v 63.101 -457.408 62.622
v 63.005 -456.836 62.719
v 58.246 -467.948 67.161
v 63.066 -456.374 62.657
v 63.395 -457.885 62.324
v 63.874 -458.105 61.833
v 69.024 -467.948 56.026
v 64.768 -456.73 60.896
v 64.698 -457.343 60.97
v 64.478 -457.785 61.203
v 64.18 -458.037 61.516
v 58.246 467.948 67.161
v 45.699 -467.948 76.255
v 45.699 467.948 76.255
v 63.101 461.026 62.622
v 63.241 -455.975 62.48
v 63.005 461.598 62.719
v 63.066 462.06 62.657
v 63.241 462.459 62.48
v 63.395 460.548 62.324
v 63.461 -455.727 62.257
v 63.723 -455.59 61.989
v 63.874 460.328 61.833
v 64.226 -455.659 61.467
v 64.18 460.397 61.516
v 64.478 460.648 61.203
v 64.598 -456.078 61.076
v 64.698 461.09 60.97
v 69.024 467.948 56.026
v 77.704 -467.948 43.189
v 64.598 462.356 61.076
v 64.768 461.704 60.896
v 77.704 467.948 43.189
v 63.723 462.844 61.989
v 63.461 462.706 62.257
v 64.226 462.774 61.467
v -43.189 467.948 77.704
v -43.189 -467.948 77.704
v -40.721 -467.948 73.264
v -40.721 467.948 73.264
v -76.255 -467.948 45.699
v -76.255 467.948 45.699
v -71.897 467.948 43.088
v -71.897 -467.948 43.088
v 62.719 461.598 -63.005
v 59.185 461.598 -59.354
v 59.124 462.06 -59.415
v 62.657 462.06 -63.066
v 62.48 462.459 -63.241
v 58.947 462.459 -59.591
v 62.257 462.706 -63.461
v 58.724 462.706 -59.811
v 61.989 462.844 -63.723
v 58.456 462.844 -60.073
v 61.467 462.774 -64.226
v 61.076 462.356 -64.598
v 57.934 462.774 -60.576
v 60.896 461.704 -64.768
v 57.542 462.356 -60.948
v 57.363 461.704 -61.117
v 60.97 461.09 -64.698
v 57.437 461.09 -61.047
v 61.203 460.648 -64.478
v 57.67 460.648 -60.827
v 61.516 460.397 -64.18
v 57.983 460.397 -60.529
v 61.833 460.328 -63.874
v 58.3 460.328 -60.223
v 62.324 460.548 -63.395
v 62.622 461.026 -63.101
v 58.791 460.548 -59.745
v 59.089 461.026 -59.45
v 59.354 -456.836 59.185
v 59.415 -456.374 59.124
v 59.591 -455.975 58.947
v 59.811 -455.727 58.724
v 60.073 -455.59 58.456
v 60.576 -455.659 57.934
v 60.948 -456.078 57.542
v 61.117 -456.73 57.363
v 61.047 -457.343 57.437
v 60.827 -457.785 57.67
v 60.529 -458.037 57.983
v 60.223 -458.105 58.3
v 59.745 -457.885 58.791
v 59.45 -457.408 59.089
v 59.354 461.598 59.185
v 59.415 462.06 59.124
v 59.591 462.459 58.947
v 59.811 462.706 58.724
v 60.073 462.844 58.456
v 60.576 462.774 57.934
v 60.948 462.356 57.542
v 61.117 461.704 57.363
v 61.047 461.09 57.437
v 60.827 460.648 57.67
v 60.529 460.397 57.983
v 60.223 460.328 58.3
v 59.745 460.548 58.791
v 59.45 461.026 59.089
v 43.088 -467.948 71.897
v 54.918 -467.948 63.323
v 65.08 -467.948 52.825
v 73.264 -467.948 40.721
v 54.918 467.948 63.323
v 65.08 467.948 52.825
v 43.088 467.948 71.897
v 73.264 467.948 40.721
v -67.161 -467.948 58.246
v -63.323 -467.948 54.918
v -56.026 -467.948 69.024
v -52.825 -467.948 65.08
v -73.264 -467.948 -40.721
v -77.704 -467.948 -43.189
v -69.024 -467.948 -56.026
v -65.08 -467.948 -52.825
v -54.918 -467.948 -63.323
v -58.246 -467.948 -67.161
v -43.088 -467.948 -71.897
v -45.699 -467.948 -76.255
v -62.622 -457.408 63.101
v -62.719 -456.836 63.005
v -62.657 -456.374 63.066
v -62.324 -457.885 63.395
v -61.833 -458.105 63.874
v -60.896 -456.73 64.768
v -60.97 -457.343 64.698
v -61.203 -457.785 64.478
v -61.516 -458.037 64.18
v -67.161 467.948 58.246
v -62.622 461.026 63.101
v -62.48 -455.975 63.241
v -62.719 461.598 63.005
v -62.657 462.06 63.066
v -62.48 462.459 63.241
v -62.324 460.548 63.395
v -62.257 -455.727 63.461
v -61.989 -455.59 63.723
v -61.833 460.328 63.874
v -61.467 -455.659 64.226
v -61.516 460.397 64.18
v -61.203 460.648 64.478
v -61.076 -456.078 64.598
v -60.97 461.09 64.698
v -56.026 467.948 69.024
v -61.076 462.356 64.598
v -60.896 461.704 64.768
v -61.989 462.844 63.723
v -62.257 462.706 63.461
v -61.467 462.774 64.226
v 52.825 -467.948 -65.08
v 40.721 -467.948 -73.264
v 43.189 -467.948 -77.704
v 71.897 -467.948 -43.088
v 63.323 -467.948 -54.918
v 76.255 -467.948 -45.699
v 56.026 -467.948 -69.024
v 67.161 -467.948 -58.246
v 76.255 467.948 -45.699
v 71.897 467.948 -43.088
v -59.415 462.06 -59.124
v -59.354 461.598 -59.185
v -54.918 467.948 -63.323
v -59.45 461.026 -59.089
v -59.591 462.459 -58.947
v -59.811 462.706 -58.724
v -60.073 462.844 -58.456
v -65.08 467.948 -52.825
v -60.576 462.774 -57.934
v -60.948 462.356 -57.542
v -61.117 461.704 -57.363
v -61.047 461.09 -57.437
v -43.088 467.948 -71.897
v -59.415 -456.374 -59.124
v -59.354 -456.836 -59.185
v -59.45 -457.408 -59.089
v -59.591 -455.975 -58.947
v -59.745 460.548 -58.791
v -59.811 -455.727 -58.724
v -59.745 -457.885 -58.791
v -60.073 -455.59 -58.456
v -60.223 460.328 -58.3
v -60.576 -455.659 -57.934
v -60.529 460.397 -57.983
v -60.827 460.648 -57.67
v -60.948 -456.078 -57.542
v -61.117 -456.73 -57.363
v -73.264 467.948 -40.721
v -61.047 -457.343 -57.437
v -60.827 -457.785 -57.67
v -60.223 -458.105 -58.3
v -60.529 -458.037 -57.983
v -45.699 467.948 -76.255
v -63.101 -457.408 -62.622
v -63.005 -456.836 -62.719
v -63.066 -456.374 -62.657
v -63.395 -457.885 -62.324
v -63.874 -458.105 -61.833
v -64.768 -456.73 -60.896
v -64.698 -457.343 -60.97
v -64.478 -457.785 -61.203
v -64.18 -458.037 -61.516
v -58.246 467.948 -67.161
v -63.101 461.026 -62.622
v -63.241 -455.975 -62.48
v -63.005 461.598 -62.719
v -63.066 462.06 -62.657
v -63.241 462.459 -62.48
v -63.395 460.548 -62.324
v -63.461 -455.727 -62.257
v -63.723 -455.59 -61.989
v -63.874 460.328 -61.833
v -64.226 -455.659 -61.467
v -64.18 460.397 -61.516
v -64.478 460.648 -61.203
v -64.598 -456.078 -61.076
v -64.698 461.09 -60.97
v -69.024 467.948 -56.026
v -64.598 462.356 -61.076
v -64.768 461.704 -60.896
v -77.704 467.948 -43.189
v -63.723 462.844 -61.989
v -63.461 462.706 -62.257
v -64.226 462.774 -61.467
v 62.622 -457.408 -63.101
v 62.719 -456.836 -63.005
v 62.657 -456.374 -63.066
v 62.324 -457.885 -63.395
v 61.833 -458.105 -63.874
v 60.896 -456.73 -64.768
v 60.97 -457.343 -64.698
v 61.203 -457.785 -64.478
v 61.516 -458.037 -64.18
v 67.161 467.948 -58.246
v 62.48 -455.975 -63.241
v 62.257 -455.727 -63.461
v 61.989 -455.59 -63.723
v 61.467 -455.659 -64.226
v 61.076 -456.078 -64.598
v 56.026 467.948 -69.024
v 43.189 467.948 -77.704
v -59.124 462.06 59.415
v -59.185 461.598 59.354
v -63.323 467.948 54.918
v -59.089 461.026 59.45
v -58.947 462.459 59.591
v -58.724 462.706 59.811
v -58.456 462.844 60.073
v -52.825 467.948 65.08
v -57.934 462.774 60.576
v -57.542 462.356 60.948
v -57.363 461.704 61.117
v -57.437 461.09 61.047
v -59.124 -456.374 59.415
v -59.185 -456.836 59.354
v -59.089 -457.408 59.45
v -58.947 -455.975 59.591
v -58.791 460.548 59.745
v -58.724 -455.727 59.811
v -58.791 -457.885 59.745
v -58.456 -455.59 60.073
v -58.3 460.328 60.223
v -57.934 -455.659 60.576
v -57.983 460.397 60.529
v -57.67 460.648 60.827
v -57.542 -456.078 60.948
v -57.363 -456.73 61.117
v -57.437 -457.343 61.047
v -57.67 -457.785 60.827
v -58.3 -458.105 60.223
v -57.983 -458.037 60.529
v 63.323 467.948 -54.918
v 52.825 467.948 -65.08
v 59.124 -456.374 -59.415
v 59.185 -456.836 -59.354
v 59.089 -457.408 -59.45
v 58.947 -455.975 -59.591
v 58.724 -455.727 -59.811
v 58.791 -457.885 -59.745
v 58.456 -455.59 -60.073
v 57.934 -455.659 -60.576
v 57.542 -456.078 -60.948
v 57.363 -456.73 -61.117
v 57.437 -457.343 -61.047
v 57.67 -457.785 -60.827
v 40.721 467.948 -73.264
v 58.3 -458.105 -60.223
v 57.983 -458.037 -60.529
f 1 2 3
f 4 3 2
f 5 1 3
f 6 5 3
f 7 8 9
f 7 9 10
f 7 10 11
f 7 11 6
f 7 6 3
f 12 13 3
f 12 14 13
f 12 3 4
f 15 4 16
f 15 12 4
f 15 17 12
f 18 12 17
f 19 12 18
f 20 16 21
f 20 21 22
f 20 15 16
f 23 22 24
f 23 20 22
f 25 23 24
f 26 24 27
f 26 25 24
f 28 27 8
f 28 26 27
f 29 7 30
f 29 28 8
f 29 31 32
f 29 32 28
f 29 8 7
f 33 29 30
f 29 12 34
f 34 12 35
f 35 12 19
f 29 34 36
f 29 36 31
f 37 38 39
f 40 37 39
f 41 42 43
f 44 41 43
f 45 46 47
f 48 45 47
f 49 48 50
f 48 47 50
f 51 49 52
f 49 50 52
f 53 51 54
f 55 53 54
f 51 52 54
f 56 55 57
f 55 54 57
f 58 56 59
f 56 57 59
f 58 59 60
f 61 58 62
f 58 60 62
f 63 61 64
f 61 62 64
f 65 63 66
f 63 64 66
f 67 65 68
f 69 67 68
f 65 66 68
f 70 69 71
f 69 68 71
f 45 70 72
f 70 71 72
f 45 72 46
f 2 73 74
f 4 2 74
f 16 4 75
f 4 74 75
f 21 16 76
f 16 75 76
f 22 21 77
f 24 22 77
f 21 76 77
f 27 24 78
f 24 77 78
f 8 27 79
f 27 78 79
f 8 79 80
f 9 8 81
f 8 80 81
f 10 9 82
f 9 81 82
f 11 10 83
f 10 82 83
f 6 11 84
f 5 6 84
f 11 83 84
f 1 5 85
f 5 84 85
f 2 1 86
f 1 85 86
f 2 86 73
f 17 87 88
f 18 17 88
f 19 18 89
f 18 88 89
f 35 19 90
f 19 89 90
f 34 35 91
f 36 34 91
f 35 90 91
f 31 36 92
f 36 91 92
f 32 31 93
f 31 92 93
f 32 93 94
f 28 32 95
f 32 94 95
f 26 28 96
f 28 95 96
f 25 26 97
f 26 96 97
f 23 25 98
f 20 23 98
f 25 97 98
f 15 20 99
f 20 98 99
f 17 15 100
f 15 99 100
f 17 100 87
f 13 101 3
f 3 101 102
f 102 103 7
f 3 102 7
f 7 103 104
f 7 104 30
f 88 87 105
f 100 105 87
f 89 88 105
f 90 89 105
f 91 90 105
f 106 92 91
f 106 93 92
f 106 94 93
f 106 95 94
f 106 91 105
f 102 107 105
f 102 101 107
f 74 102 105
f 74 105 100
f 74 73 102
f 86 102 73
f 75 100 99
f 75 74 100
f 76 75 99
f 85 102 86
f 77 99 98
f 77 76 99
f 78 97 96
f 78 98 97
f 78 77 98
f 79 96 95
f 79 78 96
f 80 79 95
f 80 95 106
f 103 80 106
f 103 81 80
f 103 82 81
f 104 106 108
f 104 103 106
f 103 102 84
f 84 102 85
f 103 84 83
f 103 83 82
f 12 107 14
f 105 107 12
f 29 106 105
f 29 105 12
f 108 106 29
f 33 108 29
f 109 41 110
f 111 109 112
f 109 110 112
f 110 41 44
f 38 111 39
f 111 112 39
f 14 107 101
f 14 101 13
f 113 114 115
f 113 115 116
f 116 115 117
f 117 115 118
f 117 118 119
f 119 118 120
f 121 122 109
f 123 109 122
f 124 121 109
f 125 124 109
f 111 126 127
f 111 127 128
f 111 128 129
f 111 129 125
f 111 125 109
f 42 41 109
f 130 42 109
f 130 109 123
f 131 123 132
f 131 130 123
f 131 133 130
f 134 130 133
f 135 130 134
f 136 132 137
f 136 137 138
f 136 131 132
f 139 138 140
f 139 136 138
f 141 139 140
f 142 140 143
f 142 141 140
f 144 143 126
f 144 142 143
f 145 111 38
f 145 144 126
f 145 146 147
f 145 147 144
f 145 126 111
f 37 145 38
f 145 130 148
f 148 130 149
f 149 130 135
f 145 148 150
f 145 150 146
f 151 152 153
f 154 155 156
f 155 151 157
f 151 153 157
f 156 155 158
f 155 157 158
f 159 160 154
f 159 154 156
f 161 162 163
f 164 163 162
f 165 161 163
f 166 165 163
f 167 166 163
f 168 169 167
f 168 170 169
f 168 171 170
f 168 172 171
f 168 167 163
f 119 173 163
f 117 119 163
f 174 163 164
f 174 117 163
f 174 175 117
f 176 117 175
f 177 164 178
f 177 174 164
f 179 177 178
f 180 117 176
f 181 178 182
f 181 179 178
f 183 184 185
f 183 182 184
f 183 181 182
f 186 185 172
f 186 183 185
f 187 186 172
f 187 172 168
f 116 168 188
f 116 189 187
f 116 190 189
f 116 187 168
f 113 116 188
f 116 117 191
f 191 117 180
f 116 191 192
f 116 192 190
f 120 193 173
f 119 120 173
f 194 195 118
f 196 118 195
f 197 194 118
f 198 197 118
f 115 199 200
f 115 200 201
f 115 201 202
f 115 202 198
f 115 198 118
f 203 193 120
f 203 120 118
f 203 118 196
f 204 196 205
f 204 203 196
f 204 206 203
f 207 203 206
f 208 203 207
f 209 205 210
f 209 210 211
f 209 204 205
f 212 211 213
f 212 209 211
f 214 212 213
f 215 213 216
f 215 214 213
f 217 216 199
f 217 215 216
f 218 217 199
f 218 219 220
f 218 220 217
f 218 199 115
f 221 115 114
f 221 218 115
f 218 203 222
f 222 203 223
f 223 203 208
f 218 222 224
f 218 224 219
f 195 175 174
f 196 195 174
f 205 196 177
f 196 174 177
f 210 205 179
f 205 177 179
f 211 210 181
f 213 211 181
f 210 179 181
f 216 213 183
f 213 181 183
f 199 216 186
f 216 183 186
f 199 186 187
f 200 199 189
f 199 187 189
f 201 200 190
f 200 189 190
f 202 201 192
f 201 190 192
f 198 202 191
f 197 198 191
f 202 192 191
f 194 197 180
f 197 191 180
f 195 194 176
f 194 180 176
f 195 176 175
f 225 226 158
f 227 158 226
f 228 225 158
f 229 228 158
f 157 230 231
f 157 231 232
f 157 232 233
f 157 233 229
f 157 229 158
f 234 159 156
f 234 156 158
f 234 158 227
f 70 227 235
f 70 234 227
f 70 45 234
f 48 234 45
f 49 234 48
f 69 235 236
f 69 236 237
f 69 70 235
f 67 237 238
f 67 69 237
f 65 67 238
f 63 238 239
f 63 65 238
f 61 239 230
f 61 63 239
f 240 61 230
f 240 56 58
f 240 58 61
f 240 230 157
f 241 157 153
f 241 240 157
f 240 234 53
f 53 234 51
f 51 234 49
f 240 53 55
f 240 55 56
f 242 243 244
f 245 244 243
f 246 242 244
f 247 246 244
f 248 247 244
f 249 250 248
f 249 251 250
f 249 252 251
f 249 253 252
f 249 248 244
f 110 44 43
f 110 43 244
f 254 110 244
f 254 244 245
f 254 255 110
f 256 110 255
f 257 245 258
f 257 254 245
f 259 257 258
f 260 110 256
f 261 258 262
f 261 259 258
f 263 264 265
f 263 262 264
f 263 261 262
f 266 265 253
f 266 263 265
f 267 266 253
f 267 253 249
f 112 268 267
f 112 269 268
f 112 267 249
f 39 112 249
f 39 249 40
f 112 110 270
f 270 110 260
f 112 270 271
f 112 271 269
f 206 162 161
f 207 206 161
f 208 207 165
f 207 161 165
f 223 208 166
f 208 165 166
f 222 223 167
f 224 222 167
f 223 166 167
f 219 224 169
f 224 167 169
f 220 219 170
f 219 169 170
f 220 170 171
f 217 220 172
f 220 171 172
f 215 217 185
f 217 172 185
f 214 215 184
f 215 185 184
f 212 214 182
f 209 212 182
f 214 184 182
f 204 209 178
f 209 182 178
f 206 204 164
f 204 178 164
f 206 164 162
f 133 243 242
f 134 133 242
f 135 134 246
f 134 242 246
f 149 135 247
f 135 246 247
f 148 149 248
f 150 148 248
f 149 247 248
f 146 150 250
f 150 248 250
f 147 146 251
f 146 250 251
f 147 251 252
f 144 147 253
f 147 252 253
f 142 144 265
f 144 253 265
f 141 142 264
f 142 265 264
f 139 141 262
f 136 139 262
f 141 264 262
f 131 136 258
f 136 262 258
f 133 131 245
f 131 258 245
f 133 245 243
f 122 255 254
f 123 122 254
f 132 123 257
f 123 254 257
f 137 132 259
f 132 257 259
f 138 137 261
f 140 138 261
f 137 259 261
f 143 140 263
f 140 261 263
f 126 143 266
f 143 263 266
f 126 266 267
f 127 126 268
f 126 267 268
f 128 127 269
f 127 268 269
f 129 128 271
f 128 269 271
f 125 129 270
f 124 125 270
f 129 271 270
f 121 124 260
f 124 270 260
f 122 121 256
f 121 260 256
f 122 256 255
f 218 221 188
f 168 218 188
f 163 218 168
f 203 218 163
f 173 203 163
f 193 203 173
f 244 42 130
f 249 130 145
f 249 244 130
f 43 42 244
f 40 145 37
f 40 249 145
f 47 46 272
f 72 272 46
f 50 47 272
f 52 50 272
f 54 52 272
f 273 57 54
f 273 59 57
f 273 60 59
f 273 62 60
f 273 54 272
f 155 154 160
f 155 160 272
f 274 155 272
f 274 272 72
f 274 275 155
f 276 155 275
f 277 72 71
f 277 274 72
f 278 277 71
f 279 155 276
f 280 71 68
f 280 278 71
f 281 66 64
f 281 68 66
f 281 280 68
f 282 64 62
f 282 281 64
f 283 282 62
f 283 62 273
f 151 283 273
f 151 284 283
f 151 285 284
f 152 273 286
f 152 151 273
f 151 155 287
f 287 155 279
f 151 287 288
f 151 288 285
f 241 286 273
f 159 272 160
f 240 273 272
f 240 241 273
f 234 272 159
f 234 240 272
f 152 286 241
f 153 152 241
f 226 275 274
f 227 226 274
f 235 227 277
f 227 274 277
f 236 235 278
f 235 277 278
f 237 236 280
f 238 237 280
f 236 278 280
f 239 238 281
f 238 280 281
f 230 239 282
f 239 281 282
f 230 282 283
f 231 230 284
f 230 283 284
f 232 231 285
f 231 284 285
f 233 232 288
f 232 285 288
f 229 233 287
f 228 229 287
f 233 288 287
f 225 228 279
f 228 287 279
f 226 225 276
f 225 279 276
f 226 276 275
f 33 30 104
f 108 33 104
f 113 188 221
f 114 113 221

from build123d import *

# Parameters (mm, degrees)
SKETCH2_R               = 88.9
SKETCH2_R_2             = 83.82
BOSS_EXTRUDE1_DEPTH     = 467.94801
CUT_EXTRUDE1_DEPTH      = 468.94801
CUT_EXTRUDE1_DEPTH_BACK = 468.94801
SKETCH5_R               = 1.27
BOLT_HOLES_DEPTH        = 29.911624556
BOLT_PATTERN_COUNT      = 4


with BuildPart() as part:
    # Sketch2 → Boss-Extrude1 (new body, symmetric)
    with BuildSketch(Plane(origin=(0, 0, 0), x_dir=(1, 0, 0), z_dir=(0, 1, 0))):
        Circle(SKETCH2_R)
        Circle(SKETCH2_R_2, mode=Mode.SUBTRACT)
    extrude(amount=BOSS_EXTRUDE1_DEPTH, both=True)

    # Sketch3 → Cut-Extrude1 (cut, two sides)
    with BuildSketch(Plane(origin=(0, 0, 0), x_dir=(1, 0, 0), z_dir=(0, 1, 0))) as cut_extrude1_sk:
        Polygon((169.661755759, -94.300371224), (0, 0), (169.661755759, 101.677593364), align=None)
        Polygon((0, 0), (53.900027233, 96.974944394), (-58.116685864, 96.974944394), align=None)
        Polygon((-123.741299607, 68.777140945), (-123.741299607, -74.157652604), (0, 0), align=None)
        Polygon((-65.840936026, -118.45858783), (0, 0), (70.991745134, -118.45858783), align=None)
    extrude(amount=CUT_EXTRUDE1_DEPTH, mode=Mode.SUBTRACT)
    extrude(cut_extrude1_sk.sketch, amount=-CUT_EXTRUDE1_DEPTH_BACK, mode=Mode.SUBTRACT)

    # Sketch5 → Bolt holes (cut, through all)
    with BuildSketch(Plane(origin=(-56.309218645, 0, 58.175814955), x_dir=(-0.718540152, 0, -0.695485478), z_dir=(0.695485478, 0, -0.718540152))):
        with Locations((-0.02278764, 461.59801)):
            Circle(SKETCH5_R)
        with Locations((-0.02278764, -456.83551)):
            Circle(SKETCH5_R)
    bolt_holes = extrude(amount=-BOLT_HOLES_DEPTH, mode=Mode.SUBTRACT)

    # Bolt pattern: Bolt holes ×4 about axis
    bolt_pattern_axis = Axis((0, 467.94801, 0), (0, 1, 0))
    for i in range(1, BOLT_PATTERN_COUNT):
        add(bolt_holes.rotate(bolt_pattern_axis, i * 360 / BOLT_PATTERN_COUNT), mode=Mode.SUBTRACT)


solid = part.part
